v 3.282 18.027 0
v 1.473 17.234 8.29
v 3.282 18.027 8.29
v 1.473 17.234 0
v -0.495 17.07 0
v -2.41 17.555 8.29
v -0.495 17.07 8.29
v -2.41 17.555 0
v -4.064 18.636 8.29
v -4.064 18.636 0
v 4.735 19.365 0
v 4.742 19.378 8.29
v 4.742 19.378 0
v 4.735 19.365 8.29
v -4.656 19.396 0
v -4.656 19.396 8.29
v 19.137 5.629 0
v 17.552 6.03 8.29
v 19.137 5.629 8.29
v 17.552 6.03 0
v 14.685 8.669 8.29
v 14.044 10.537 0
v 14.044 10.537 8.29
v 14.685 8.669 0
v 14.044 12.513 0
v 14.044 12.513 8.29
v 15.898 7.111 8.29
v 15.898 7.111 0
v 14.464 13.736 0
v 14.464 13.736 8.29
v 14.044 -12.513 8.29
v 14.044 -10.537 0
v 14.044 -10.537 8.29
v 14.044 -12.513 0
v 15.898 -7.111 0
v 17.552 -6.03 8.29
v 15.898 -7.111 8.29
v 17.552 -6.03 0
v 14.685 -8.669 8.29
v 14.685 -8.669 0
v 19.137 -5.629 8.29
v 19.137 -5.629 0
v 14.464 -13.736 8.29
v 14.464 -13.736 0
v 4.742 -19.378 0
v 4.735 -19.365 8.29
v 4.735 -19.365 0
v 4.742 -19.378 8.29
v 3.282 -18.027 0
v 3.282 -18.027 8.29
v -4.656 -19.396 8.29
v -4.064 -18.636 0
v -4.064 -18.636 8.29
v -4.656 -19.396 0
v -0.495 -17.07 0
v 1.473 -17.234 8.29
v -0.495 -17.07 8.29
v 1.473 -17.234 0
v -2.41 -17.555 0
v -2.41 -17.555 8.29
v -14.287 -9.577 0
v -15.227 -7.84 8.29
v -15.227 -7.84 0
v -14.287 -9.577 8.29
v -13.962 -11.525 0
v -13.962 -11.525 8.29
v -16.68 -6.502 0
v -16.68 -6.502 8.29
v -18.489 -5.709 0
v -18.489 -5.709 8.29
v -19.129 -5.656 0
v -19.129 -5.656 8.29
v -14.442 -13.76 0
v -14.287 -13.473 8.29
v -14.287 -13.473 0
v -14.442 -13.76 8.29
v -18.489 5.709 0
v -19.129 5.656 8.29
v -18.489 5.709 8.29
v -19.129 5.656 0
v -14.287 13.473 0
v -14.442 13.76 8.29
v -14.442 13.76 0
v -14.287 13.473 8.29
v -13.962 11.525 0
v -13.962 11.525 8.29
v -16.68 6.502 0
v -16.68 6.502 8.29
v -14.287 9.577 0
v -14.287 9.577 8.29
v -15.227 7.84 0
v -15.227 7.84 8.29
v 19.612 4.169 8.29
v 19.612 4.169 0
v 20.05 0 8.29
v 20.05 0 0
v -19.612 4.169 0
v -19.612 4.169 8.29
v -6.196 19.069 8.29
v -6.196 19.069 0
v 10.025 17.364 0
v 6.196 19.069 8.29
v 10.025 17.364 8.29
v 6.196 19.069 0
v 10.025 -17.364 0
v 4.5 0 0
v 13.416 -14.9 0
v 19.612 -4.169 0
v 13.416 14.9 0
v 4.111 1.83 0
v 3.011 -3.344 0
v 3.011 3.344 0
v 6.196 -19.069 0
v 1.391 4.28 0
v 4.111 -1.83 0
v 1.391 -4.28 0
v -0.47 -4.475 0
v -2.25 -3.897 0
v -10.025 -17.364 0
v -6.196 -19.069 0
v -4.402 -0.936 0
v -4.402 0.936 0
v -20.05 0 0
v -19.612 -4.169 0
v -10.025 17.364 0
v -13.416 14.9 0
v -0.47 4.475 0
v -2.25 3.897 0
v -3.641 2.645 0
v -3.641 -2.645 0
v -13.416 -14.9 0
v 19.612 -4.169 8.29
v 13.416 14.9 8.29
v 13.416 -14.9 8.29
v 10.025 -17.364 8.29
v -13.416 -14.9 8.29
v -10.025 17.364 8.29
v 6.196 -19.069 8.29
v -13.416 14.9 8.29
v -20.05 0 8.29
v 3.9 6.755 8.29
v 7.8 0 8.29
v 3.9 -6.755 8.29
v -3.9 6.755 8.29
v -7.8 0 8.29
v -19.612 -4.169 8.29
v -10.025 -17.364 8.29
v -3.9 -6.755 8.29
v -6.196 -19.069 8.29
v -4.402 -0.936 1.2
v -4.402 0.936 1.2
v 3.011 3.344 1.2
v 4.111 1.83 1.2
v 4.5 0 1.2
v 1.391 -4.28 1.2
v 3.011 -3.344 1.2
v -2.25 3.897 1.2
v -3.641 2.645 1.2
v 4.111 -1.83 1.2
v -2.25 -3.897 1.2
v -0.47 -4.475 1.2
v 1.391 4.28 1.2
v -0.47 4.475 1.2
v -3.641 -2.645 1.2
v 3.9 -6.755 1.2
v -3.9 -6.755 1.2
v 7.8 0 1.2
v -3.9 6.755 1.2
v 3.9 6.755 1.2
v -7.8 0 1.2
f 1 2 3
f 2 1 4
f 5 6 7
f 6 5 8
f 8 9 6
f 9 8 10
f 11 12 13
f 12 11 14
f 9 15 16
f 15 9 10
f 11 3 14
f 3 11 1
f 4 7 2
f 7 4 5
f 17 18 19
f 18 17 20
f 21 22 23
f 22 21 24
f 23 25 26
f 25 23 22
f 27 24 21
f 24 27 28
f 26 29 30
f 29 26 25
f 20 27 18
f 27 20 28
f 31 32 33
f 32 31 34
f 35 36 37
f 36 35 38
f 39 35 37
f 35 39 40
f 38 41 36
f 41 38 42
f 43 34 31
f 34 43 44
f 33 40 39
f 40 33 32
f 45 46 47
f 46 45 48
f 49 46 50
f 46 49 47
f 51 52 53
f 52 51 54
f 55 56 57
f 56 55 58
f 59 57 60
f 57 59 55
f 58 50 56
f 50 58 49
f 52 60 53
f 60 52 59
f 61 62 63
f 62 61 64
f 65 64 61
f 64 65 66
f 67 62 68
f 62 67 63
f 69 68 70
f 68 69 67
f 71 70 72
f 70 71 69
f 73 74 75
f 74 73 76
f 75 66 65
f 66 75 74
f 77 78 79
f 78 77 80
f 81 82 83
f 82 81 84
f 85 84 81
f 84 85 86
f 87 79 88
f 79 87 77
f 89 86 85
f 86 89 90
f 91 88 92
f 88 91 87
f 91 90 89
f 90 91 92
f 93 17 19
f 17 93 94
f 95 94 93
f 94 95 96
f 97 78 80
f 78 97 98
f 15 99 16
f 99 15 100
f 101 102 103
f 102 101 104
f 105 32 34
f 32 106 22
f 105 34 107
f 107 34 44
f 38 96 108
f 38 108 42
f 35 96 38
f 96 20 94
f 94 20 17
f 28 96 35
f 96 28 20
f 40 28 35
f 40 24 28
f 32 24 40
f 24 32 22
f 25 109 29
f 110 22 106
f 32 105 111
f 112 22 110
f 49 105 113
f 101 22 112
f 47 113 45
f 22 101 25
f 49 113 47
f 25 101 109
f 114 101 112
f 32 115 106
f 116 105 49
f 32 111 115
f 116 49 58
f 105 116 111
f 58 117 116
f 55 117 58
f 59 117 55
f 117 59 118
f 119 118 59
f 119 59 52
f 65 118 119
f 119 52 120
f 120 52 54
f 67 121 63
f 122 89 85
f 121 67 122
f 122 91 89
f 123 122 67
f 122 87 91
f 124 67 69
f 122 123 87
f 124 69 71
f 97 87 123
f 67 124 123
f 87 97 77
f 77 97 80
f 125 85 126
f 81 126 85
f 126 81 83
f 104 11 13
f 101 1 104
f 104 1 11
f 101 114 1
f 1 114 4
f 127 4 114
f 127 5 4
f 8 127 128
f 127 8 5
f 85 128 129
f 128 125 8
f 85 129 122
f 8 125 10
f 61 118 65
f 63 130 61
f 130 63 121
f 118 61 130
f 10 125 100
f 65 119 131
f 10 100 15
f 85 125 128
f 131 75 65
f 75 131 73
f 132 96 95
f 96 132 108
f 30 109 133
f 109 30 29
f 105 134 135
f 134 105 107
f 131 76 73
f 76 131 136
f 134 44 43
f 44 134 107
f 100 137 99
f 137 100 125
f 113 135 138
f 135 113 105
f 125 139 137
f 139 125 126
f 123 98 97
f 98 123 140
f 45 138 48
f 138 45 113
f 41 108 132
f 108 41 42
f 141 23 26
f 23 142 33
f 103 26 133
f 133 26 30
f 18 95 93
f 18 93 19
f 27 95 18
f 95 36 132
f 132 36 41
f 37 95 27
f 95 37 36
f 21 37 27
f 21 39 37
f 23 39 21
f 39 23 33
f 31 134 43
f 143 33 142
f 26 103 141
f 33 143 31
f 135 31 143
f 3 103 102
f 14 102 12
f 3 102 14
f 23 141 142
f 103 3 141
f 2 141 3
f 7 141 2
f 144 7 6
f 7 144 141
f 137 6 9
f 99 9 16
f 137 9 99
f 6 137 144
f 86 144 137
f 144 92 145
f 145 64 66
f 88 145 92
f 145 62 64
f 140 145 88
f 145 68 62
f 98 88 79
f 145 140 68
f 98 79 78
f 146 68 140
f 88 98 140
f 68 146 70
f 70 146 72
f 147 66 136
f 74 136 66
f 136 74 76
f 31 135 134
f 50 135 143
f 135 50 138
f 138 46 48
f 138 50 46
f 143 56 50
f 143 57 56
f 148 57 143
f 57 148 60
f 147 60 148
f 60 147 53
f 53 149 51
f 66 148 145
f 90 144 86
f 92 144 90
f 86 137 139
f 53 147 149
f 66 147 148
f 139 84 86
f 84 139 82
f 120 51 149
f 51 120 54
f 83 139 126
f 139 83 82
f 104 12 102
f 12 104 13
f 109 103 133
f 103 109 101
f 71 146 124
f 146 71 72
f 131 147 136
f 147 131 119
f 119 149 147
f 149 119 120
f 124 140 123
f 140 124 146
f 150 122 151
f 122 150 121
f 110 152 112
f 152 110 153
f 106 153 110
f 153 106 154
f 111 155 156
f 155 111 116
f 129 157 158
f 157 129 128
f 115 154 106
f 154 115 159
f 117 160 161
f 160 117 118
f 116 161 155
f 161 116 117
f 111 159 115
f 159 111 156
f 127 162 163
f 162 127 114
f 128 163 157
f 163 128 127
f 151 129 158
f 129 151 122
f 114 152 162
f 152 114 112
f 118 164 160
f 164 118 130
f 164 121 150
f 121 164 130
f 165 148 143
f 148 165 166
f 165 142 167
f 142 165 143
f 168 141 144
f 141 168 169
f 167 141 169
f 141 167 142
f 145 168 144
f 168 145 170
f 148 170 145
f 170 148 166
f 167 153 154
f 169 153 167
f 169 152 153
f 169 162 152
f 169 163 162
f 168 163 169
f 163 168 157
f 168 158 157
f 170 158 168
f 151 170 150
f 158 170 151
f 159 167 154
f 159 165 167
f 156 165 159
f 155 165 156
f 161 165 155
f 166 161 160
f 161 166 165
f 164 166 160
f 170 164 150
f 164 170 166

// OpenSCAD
/*

Parametric knob generator
by Gian Pablo Villamil
May 2011

Makes knurled knobs that accomodate a nut in the middle, useful for things
like camera mounts.

version for 3/8 inch nut

*/

knob_radius = 20.05;
dent_radius = 06;
knob_height = 8.29;
num_dents = 6;
dent_offset = 3;

nut_hole_radius = 4.5; // half of 1/4 inch in millimeters
nut_size_radius = 15.6/2; // point to point size of nut

module knob()
{
	translate([0, 0, 0]) {
		difference() {
		cylinder(h = knob_height, r = knob_radius);
		for (i = [0:(num_dents - 1)]) {
			translate([sin(360*i/num_dents)*(knob_radius+dent_offset), cos(360*i/num_dents)*(knob_radius+dent_offset), -5 ])
			cylinder(h = knob_height+10, r=dent_radius);
			}
		translate([0,0,-5]) cylinder(h = knob_height+10, r=nut_hole_radius,$fa=10);
		translate([0,0,1.2]) cylinder(h = knob_height+10, r=nut_size_radius,$fa=60);
		}
	}
}

knob();
